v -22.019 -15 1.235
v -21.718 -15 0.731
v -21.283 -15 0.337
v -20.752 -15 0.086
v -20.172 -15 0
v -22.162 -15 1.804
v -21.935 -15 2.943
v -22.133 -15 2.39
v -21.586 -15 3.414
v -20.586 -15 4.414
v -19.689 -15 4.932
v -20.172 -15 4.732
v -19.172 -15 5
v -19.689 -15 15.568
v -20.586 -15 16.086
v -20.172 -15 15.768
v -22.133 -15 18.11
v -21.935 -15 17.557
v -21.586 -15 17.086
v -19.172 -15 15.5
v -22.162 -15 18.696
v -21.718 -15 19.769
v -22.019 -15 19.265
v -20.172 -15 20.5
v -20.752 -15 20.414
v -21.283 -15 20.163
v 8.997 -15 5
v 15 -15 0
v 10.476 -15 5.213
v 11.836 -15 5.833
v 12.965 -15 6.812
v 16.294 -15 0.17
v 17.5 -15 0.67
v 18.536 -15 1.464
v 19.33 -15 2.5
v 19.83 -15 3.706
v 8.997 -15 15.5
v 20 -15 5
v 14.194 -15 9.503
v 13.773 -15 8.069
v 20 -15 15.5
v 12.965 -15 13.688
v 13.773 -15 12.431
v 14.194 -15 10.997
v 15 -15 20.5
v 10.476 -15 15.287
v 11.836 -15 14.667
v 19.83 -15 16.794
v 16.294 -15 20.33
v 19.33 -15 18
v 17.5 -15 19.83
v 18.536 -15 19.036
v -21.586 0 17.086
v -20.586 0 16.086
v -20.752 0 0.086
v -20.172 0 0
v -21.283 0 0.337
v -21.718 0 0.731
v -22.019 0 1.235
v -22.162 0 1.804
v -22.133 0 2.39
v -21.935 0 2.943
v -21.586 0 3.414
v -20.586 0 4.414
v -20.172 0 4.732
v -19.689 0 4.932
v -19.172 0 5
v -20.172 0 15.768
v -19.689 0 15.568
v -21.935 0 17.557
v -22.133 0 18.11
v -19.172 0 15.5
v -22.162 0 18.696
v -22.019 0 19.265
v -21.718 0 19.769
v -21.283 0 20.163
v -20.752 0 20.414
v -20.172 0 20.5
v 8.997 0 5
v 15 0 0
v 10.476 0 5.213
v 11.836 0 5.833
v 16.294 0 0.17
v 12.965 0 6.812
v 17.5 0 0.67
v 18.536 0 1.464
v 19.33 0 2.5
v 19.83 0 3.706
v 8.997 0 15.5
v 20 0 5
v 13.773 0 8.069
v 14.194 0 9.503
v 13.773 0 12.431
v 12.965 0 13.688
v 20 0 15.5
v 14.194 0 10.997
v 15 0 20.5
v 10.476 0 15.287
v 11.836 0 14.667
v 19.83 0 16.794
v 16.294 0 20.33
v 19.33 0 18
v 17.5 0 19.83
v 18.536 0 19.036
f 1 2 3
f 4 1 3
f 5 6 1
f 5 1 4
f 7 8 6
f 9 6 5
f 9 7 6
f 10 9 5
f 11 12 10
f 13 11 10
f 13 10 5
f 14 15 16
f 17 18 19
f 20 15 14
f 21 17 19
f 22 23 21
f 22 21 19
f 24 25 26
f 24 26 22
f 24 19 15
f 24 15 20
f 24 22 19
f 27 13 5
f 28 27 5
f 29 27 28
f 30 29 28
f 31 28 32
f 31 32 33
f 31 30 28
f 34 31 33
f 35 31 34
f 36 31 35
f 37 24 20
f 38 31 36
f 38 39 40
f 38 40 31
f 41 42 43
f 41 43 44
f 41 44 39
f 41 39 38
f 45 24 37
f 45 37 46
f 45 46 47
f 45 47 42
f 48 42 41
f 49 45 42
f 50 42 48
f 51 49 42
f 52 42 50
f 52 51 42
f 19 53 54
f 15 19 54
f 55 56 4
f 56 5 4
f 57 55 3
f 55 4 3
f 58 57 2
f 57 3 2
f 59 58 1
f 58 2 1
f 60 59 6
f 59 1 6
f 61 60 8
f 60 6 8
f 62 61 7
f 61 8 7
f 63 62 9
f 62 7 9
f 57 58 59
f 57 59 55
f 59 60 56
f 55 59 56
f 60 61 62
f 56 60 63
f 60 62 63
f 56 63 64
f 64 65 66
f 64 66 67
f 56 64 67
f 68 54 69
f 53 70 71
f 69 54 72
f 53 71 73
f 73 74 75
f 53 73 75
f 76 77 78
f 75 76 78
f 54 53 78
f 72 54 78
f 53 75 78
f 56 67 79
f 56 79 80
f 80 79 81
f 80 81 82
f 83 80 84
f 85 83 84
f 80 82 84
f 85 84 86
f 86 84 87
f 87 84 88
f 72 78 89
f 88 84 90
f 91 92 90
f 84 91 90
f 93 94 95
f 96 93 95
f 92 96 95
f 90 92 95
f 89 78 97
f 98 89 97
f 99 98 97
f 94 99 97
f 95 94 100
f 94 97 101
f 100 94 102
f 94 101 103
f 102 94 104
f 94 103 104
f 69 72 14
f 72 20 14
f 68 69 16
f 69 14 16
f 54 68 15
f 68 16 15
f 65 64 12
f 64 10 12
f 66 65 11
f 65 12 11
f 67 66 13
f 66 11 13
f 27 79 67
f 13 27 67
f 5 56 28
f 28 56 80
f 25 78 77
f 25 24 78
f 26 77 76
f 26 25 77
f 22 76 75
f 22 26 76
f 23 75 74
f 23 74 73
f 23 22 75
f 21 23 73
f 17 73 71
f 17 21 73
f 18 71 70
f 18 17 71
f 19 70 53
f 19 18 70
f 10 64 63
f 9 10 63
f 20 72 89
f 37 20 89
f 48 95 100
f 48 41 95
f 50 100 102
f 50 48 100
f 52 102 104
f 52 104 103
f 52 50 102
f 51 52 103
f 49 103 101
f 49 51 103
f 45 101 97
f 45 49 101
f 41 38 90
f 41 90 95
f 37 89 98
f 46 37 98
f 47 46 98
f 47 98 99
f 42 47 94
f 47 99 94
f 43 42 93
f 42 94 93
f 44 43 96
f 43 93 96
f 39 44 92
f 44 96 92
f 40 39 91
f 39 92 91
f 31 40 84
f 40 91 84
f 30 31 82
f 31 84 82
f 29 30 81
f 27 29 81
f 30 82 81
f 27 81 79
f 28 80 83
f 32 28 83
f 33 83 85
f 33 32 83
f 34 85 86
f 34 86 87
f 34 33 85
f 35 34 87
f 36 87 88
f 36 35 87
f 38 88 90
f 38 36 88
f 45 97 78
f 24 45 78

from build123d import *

# Parameters (mm, degrees)
F1_DEPTH = 15
F2_R     = 5
F3_R     = 2


with BuildPart() as f1:
    # F0 (on Front) → F1 (new body)
    with BuildSketch(Plane.XZ):
        with BuildLine():
            Line((-20, 5), (-25, 0))
            Line((-25, 0), (20, 0))
            Line((20, 0), (20, 20.5))
            Line((20, 20.5), (-25, 20.5))
            Line((-25, 20.5), (-20, 15.5))
            Line((-20, 15.5), (8.997297, 15.5))
            ThreePointArc((8.997297, 15.5), (14.247297, 10.25), (8.997297, 5))
            Line((8.997297, 5), (-20, 5))
        make_face()
    extrude(amount=F1_DEPTH)

    # F2
    f2_edges = [f1.edges().sort_by_distance(p)[0] for p in [
        (20, -7.5, 20.5),
        (20, -7.5, 0),
    ]]
    fillet(f2_edges, radius=F2_R)

    # F3
    f3_edges = [f1.edges().sort_by_distance(p)[0] for p in [
        (-25, -7.5, 20.5),
        (-20, -7.5, 5),
        (-25, -7.5, 0),
        (-20, -7.5, 15.5),
    ]]
    fillet(f3_edges, radius=F3_R)


solid = f1.part
